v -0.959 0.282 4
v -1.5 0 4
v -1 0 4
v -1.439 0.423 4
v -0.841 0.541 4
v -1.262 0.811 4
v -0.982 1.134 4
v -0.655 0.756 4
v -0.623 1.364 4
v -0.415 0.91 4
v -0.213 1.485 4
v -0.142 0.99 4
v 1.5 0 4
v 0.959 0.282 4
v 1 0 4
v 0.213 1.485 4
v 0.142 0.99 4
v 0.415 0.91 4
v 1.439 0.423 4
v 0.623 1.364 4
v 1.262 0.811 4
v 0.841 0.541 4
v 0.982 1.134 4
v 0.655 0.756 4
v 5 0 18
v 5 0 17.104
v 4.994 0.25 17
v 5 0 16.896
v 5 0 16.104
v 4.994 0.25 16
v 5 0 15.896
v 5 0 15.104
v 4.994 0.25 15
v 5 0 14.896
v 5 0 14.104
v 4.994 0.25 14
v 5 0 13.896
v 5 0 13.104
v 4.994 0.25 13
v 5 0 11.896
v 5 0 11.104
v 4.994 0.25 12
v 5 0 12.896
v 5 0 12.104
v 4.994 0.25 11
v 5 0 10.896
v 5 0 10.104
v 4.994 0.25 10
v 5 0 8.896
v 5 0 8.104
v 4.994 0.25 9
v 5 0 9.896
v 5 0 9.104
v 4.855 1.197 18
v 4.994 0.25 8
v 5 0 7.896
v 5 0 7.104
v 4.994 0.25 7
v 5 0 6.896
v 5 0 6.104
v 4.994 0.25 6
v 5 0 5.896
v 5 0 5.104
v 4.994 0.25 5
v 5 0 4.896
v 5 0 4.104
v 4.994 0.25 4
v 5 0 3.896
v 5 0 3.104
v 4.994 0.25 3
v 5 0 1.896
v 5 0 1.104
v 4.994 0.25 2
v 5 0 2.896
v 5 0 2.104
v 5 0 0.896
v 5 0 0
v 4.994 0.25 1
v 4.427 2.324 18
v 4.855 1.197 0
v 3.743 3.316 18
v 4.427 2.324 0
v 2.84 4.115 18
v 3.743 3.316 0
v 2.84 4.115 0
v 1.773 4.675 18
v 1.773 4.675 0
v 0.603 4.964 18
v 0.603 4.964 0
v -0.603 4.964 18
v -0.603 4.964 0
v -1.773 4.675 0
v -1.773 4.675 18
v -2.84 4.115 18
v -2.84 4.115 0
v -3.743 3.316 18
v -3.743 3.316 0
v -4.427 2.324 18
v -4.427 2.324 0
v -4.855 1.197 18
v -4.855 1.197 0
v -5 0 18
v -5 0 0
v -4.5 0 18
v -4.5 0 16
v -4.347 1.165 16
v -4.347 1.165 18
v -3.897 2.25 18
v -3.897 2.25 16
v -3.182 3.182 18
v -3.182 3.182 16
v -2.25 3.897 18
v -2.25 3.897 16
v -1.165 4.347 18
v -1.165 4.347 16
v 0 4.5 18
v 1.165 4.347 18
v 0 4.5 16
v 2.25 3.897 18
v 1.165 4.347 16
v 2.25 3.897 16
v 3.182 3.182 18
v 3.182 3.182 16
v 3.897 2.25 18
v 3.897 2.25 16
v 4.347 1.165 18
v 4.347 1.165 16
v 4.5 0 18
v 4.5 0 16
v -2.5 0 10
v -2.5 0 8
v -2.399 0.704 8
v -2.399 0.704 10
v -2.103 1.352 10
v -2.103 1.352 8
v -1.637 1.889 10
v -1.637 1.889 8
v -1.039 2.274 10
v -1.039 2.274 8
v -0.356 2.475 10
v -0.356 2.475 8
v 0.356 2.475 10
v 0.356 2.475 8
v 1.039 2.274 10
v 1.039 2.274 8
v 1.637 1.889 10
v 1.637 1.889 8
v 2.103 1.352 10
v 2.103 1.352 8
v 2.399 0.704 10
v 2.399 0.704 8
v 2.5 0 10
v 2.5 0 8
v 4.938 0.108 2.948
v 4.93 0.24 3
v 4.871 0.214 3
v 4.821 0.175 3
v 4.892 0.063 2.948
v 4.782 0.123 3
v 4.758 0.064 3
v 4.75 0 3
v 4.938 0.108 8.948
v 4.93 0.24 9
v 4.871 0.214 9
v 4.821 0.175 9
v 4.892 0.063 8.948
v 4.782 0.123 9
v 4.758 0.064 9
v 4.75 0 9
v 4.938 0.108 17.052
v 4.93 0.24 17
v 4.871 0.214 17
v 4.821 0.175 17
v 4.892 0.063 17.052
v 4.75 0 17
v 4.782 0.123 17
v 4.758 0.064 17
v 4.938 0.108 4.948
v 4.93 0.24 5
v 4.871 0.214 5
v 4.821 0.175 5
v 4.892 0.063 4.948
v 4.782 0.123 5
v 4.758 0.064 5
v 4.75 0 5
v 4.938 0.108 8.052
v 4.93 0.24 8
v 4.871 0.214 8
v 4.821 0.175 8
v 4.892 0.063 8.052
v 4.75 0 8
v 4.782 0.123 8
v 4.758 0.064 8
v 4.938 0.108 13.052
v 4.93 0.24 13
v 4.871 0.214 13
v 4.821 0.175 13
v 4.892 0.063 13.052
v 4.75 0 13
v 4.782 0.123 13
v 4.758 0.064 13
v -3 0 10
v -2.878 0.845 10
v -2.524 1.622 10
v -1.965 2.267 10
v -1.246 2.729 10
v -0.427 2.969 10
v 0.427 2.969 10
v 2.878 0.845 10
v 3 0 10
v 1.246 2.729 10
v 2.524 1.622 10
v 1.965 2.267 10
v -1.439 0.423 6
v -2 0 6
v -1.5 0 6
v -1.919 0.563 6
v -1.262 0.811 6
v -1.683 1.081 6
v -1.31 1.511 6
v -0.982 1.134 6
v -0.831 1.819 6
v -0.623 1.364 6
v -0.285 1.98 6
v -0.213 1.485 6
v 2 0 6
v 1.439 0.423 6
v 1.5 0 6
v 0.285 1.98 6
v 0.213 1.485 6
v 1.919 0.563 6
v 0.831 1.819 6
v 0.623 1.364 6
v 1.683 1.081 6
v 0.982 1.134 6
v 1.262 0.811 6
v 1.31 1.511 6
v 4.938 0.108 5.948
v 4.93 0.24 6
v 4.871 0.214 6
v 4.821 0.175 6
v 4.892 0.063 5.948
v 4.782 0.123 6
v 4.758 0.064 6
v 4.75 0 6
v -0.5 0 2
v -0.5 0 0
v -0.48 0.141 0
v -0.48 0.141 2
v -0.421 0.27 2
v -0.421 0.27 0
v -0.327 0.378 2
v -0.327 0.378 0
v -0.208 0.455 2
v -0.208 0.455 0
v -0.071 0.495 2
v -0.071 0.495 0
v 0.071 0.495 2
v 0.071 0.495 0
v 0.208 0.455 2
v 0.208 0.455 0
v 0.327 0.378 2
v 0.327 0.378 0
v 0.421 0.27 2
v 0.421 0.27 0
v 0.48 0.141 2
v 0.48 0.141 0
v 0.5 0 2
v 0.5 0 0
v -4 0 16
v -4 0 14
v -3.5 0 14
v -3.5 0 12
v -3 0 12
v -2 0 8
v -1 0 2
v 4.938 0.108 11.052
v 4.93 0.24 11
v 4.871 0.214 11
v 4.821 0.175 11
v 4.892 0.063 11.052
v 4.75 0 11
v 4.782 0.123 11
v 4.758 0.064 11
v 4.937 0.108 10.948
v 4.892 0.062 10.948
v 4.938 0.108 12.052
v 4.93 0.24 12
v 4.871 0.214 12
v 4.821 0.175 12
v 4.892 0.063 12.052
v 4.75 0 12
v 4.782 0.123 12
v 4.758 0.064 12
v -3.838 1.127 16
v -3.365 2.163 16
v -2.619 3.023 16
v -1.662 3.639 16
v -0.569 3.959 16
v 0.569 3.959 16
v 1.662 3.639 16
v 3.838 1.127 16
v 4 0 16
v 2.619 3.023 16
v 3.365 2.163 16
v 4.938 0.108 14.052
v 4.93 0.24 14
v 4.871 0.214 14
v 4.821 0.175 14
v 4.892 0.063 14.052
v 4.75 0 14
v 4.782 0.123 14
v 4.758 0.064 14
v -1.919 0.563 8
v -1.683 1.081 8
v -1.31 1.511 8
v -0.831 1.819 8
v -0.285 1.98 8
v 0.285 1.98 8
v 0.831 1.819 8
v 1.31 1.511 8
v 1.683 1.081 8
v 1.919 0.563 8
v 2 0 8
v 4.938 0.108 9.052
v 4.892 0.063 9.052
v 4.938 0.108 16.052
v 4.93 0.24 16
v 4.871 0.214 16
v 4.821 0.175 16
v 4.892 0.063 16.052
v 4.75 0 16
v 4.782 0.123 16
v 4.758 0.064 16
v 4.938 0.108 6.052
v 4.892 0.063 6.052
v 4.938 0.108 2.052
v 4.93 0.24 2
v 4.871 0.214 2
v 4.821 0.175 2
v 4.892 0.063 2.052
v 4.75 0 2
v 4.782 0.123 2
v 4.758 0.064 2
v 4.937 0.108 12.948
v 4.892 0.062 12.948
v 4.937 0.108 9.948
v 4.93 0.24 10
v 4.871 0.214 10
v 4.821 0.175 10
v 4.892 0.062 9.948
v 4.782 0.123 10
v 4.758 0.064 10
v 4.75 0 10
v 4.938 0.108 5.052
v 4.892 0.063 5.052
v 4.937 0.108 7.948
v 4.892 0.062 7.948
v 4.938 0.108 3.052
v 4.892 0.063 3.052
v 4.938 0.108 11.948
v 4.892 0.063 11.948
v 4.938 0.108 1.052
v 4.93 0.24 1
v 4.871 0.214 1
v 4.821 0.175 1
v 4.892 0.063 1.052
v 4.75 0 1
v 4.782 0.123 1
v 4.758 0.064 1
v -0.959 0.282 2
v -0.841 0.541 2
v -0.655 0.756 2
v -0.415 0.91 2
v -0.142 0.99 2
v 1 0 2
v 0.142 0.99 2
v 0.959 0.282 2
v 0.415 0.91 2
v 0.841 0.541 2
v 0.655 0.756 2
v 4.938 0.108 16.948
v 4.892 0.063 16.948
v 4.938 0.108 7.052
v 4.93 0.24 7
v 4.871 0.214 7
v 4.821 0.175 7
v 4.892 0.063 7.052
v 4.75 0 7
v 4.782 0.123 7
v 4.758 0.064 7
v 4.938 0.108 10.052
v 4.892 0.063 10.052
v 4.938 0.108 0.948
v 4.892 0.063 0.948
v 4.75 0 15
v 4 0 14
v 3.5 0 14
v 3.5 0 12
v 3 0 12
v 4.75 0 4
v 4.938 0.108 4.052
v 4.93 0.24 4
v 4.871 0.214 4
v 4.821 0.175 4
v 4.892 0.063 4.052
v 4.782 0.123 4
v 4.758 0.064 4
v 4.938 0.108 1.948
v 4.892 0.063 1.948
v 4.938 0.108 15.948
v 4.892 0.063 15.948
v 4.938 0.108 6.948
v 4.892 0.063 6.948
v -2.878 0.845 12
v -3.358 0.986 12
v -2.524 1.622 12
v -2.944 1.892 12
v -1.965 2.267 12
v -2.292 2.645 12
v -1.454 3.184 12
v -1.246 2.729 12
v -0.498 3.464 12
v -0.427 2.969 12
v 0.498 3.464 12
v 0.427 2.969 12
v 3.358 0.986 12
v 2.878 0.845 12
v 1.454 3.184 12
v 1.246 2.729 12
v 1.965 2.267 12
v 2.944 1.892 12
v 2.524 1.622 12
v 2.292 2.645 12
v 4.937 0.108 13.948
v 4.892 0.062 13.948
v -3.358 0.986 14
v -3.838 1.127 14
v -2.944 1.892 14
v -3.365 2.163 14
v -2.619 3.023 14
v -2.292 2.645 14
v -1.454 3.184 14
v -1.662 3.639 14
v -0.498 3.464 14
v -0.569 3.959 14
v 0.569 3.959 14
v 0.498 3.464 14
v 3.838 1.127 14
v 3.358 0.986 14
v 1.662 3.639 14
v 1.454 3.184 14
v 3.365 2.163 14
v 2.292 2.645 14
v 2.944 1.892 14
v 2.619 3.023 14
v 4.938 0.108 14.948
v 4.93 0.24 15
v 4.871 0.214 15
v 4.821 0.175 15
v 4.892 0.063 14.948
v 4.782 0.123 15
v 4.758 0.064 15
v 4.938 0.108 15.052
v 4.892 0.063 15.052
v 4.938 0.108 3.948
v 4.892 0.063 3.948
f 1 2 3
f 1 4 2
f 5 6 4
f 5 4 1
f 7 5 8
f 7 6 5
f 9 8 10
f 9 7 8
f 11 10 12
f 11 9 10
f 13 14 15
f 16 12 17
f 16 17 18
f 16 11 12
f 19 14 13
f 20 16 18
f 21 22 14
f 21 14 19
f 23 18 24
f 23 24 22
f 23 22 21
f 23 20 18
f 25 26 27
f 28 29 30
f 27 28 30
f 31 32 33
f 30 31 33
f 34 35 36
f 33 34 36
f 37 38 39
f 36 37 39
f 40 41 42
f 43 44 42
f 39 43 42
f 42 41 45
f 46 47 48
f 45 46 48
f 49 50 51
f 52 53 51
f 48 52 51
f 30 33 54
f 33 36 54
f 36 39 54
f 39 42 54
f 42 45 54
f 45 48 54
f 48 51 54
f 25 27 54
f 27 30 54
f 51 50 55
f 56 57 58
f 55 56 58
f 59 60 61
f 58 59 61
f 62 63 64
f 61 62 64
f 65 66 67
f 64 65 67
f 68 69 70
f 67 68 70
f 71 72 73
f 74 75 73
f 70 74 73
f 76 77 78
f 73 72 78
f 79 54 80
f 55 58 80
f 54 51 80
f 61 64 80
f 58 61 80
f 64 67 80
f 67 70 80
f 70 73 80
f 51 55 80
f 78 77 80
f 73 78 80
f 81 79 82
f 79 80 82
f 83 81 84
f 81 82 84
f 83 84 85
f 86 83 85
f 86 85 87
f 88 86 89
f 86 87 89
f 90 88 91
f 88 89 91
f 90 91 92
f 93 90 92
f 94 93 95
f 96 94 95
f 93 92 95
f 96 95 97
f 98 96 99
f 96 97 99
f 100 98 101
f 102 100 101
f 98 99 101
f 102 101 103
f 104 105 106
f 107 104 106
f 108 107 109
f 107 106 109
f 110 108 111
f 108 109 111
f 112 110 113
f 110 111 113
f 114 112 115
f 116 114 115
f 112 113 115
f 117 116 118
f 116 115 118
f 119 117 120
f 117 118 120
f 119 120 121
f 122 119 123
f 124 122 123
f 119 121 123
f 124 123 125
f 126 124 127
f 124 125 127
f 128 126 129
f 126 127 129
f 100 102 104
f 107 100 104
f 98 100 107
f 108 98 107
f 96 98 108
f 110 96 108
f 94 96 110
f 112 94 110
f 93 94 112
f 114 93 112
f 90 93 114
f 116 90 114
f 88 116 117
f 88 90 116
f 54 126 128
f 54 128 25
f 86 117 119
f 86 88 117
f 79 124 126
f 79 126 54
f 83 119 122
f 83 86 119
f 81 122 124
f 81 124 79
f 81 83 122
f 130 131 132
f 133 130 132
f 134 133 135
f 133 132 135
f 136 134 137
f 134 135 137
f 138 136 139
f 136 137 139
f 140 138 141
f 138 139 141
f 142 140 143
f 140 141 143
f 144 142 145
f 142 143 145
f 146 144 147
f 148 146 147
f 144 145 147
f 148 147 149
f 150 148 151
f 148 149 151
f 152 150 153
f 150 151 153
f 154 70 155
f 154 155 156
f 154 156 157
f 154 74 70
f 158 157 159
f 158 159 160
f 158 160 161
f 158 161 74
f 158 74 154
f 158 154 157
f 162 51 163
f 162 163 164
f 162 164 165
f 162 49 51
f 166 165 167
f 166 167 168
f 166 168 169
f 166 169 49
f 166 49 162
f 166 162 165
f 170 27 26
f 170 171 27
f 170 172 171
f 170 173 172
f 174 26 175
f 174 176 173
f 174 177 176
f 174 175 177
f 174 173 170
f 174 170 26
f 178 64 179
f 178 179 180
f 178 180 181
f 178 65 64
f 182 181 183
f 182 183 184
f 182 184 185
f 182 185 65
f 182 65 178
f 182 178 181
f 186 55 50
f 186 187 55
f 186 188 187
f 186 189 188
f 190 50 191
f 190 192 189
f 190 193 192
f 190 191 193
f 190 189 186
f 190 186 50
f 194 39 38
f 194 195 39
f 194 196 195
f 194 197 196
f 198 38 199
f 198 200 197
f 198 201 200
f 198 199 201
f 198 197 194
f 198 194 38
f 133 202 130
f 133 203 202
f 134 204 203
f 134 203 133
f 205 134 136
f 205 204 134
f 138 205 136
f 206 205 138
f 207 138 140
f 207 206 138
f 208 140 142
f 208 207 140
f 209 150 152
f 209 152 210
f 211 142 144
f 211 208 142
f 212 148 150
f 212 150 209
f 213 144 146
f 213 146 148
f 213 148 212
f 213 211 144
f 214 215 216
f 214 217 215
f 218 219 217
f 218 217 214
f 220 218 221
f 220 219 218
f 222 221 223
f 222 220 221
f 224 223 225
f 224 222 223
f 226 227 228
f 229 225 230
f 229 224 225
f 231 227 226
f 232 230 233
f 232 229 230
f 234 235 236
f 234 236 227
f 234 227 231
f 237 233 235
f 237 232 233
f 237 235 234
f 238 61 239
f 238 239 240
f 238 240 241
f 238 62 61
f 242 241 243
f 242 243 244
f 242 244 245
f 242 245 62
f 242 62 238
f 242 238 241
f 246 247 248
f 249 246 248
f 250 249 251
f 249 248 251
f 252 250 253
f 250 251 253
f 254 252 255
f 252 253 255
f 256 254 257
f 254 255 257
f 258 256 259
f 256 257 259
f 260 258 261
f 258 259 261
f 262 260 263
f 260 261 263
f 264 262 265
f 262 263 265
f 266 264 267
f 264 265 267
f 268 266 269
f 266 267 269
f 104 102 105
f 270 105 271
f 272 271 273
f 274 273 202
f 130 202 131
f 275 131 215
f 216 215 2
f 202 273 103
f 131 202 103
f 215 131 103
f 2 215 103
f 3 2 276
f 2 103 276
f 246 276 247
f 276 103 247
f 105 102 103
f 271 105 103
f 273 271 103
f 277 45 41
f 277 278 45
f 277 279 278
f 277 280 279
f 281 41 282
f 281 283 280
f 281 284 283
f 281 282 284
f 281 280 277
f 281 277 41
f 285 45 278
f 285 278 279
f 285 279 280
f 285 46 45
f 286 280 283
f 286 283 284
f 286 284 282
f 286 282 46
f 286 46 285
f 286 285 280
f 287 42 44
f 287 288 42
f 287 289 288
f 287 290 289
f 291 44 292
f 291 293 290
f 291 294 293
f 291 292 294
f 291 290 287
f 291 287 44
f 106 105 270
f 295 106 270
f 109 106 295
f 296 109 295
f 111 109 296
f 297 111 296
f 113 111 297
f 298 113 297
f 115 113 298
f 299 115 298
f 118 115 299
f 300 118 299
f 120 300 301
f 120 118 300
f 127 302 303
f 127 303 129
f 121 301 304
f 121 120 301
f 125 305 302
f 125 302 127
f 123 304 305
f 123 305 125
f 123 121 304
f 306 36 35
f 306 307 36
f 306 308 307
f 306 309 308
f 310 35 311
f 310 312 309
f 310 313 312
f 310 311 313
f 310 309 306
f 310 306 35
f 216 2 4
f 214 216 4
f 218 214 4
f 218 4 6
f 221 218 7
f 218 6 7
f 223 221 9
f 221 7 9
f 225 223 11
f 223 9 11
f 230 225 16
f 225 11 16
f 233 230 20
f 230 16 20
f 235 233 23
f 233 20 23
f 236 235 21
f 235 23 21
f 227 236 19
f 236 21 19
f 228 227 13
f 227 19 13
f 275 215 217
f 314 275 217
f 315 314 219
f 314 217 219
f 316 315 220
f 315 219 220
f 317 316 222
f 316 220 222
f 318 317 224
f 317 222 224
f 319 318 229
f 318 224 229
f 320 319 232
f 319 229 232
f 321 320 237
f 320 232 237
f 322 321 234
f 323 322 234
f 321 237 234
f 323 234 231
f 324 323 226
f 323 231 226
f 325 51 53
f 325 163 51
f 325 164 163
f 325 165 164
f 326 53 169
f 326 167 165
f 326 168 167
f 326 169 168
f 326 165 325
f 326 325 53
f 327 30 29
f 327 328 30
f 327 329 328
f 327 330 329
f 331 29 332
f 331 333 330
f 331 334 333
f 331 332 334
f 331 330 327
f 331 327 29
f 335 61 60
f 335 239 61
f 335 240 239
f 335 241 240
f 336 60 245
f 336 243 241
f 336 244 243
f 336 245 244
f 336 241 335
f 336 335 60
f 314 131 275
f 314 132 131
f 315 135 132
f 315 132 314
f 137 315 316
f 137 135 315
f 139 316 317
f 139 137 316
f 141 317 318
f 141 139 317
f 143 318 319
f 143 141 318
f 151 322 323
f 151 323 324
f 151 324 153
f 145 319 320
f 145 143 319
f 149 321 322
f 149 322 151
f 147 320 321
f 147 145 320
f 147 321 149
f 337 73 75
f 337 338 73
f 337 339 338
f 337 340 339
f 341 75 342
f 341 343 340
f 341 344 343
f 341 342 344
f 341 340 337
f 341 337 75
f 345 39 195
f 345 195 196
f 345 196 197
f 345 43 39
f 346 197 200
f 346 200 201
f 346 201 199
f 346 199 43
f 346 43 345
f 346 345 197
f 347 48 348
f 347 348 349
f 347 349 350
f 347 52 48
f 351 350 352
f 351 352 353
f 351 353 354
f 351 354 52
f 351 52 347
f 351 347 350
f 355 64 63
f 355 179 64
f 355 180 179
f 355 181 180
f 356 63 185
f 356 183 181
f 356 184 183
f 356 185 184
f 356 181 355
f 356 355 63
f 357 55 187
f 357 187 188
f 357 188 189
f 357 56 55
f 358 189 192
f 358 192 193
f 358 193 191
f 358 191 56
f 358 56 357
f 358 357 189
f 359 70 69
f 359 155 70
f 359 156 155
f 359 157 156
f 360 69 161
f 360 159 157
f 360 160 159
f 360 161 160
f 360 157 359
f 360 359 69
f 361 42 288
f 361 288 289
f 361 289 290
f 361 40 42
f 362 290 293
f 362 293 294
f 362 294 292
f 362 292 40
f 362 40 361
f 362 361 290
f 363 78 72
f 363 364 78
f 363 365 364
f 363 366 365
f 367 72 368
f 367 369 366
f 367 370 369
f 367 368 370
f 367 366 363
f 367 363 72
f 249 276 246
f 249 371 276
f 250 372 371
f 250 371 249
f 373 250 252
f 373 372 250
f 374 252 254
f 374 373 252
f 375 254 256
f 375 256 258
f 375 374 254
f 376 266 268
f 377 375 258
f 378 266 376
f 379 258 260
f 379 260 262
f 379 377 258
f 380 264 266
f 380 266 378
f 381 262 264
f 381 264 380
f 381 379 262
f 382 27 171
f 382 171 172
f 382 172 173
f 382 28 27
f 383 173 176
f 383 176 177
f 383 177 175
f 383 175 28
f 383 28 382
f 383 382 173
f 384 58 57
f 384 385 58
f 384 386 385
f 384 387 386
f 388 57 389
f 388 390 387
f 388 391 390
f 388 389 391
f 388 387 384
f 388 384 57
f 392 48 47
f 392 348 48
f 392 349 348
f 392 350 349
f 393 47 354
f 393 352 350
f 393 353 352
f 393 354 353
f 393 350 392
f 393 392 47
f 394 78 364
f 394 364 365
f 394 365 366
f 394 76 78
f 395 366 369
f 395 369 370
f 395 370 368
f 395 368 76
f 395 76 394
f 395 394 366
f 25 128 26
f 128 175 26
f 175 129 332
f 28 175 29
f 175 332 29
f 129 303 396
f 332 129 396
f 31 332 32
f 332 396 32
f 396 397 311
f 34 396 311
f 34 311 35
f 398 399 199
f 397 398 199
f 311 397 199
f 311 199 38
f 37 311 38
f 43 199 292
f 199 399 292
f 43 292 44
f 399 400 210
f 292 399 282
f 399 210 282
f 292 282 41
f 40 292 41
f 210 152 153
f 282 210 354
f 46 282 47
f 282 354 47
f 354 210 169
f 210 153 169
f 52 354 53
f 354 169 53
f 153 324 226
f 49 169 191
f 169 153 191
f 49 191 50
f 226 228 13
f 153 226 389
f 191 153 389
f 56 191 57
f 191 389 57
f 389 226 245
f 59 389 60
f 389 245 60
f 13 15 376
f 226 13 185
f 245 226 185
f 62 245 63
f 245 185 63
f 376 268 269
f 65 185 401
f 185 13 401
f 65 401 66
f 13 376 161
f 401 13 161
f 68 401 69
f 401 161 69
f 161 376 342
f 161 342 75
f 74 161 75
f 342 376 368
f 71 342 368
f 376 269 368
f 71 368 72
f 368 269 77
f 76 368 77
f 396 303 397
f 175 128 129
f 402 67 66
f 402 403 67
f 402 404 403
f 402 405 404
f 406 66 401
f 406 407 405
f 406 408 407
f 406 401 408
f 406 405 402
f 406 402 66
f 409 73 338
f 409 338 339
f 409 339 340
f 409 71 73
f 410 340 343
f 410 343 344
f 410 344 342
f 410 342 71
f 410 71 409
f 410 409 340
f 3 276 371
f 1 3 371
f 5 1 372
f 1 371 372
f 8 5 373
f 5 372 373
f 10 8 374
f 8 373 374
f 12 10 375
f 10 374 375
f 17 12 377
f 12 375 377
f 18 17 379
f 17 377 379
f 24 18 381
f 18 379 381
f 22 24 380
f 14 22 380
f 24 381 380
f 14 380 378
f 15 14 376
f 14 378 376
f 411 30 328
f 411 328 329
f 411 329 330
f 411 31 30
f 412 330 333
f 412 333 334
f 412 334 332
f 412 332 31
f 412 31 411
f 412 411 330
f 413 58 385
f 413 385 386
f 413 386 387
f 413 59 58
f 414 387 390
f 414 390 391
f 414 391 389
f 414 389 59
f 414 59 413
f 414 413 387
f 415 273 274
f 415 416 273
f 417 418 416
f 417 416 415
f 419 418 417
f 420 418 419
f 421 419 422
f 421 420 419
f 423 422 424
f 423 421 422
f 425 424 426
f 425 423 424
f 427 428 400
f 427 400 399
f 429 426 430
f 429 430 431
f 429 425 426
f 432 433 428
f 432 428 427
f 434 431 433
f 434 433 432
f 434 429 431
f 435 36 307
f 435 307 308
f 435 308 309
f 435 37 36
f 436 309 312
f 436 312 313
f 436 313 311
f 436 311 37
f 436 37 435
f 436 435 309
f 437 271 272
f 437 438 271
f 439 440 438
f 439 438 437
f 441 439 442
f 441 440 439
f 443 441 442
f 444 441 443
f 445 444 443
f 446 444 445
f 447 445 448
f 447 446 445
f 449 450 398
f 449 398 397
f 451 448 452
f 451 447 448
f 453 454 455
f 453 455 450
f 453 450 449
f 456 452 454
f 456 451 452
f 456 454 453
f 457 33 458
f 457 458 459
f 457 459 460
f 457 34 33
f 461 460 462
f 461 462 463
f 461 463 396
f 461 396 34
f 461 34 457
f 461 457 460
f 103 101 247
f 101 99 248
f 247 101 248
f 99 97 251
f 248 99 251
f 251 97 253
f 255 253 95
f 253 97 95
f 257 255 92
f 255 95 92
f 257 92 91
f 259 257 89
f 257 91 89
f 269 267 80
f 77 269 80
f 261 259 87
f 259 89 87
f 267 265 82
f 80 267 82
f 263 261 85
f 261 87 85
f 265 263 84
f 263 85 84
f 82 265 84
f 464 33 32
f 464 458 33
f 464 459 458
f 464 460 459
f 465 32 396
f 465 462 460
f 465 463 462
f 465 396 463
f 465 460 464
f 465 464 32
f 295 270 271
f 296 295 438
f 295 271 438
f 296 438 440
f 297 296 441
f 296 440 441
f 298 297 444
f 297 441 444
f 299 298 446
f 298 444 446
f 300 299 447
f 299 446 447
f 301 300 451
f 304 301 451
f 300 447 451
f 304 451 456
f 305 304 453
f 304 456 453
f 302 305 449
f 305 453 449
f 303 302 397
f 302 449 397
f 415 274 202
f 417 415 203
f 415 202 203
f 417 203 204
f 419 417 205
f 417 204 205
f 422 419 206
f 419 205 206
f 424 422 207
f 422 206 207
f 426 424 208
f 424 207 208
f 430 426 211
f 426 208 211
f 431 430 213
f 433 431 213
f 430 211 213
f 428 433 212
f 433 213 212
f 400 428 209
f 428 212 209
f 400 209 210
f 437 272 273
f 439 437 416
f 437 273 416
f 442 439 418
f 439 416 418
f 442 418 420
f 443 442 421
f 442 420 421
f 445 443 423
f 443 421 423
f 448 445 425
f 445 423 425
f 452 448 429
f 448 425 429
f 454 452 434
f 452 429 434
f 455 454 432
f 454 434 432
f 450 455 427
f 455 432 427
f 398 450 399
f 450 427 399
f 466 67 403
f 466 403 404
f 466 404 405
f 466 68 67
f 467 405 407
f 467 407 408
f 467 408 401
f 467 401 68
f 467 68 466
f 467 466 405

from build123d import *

# Parameters (mm, degrees)
F1_DEPTH = 18
F2_DEPTH = 16
F3_DEPTH = 14
F4_DEPTH = 12
F5_DEPTH = 10
F6_DEPTH = 8
F7_DEPTH = 6
F8_DEPTH = 4
F9_DEPTH = 2


with BuildPart() as f1:
    # F0 (on Top) → F1 (new body)
    with BuildSketch(Plane.XY):
        with BuildLine():
            Line((-5, 0), (-4.5, 0))
            ThreePointArc((-4.5, 0), (0, 4.5), (4.5, 0))
            Line((4.5, 0), (5, 0))
            ThreePointArc((5, 0), (0, 5), (-5, 0))
        make_face()
    extrude(amount=F1_DEPTH)

    # F0 (on Top) → F2 (join)
    with BuildSketch(Plane.XY):
        with BuildLine():
            Line((-4.5, 0), (-4, 0))
            ThreePointArc((-4, 0), (0, 4), (4, 0))
            Line((4, 0), (4.5, 0))
            ThreePointArc((4.5, 0), (0, 4.5), (-4.5, 0))
        make_face()
    extrude(amount=F2_DEPTH)

    # F0 (on Top) → F3 (join)
    with BuildSketch(Plane.XY):
        with BuildLine():
            Line((-4, 0), (-3.5, 0))
            ThreePointArc((-3.5, 0), (0, 3.5), (3.5, 0))
            Line((3.5, 0), (4, 0))
            ThreePointArc((4, 0), (0, 4), (-4, 0))
        make_face()
    extrude(amount=F3_DEPTH)

    # F0 (on Top) → F4 (join)
    with BuildSketch(Plane.XY):
        with BuildLine():
            Line((-3.5, 0), (-3, 0))
            ThreePointArc((-3, 0), (0, 3), (3, 0))
            Line((3, 0), (3.5, 0))
            ThreePointArc((3.5, 0), (0, 3.5), (-3.5, 0))
        make_face()
    extrude(amount=F4_DEPTH)

    # F0 (on Top) → F5 (join)
    with BuildSketch(Plane.XY):
        with BuildLine():
            Line((-3, 0), (-2.5, 0))
            ThreePointArc((-2.5, 0), (0, 2.5), (2.5, 0))
            Line((2.5, 0), (3, 0))
            ThreePointArc((3, 0), (0, 3), (-3, 0))
        make_face()
    extrude(amount=F5_DEPTH)

    # F0 (on Top) → F6 (join)
    with BuildSketch(Plane.XY):
        with BuildLine():
            Line((-2.5, 0), (-2, 0))
            ThreePointArc((-2, 0), (0, 2), (2, 0))
            Line((2, 0), (2.5, 0))
            ThreePointArc((2.5, 0), (0, 2.5), (-2.5, 0))
        make_face()
    extrude(amount=F6_DEPTH)

    # F0 (on Top) → F7 (join)
    with BuildSketch(Plane.XY):
        with BuildLine():
            Line((-2, 0), (-1.5, 0))
            ThreePointArc((-1.5, 0), (0, 1.5), (1.5, 0))
            Line((1.5, 0), (2, 0))
            ThreePointArc((2, 0), (0, 2), (-2, 0))
        make_face()
    extrude(amount=F7_DEPTH)

    # F0 (on Top) → F8 (join)
    with BuildSketch(Plane.XY):
        with BuildLine():
            Line((-1.5, 0), (-1, 0))
            ThreePointArc((-1, 0), (0, 1), (1, 0))
            Line((1, 0), (1.5, 0))
            ThreePointArc((1.5, 0), (0, 1.5), (-1.5, 0))
        make_face()
    extrude(amount=F8_DEPTH)

    # F0 (on Top) → F9 (join)
    with BuildSketch(Plane.XY):
        with BuildLine():
            Line((-1, 0), (-0.5, 0))
            ThreePointArc((-0.5, 0), (0, 0.5), (0.5, 0))
            Line((0.5, 0), (1, 0))
            ThreePointArc((1, 0), (0, 1), (-1, 0))
        make_face()
    extrude(amount=F9_DEPTH)

    # F10 (on Front) → F11 (revolve, cut)
    with BuildSketch(Plane.XZ):
        Polygon((5, 17.103553), (4.75, 17), (5, 16.896447), align=None)
        Polygon((4.75, 16), (5, 15.896447), (5, 16.103553), align=None)
        Polygon((4.75, 15), (5, 14.896447), (5, 15.103553), align=None)
        Polygon((4.75, 14), (5, 13.896447), (5, 14.103553), align=None)
        Polygon((4.75, 13), (5, 12.896447), (5, 13.103553), align=None)
        Polygon((4.75, 12), (5, 11.896447), (5, 12.103553), align=None)
        Polygon((4.75, 11), (5, 10.896447), (5, 11.103553), align=None)
        Polygon((4.75, 10), (5, 9.896447), (5, 10.103553), align=None)
        Polygon((4.75, 9), (5, 8.896447), (5, 9.103553), align=None)
        Polygon((4.75, 8), (5, 7.896447), (5, 8.103553), align=None)
        Polygon((4.75, 7), (5, 6.896447), (5, 7.103553), align=None)
        Polygon((4.75, 1), (5, 0.896447), (5, 1.103553), align=None)
        Polygon((4.75, 2), (5, 1.896447), (5, 2.103553), align=None)
        Polygon((4.75, 3), (5, 2.896447), (5, 3.103553), align=None)
        Polygon((4.75, 4), (5, 3.896447), (5, 4.103553), align=None)
        Polygon((4.75, 5), (5, 4.896447), (5, 5.103553), align=None)
        Polygon((4.75, 6), (5, 5.896447), (5, 6.103553), align=None)
    revolve(axis=Axis((5, 0, 9), (0, 0, 1)), mode=Mode.SUBTRACT)


solid = f1.part
